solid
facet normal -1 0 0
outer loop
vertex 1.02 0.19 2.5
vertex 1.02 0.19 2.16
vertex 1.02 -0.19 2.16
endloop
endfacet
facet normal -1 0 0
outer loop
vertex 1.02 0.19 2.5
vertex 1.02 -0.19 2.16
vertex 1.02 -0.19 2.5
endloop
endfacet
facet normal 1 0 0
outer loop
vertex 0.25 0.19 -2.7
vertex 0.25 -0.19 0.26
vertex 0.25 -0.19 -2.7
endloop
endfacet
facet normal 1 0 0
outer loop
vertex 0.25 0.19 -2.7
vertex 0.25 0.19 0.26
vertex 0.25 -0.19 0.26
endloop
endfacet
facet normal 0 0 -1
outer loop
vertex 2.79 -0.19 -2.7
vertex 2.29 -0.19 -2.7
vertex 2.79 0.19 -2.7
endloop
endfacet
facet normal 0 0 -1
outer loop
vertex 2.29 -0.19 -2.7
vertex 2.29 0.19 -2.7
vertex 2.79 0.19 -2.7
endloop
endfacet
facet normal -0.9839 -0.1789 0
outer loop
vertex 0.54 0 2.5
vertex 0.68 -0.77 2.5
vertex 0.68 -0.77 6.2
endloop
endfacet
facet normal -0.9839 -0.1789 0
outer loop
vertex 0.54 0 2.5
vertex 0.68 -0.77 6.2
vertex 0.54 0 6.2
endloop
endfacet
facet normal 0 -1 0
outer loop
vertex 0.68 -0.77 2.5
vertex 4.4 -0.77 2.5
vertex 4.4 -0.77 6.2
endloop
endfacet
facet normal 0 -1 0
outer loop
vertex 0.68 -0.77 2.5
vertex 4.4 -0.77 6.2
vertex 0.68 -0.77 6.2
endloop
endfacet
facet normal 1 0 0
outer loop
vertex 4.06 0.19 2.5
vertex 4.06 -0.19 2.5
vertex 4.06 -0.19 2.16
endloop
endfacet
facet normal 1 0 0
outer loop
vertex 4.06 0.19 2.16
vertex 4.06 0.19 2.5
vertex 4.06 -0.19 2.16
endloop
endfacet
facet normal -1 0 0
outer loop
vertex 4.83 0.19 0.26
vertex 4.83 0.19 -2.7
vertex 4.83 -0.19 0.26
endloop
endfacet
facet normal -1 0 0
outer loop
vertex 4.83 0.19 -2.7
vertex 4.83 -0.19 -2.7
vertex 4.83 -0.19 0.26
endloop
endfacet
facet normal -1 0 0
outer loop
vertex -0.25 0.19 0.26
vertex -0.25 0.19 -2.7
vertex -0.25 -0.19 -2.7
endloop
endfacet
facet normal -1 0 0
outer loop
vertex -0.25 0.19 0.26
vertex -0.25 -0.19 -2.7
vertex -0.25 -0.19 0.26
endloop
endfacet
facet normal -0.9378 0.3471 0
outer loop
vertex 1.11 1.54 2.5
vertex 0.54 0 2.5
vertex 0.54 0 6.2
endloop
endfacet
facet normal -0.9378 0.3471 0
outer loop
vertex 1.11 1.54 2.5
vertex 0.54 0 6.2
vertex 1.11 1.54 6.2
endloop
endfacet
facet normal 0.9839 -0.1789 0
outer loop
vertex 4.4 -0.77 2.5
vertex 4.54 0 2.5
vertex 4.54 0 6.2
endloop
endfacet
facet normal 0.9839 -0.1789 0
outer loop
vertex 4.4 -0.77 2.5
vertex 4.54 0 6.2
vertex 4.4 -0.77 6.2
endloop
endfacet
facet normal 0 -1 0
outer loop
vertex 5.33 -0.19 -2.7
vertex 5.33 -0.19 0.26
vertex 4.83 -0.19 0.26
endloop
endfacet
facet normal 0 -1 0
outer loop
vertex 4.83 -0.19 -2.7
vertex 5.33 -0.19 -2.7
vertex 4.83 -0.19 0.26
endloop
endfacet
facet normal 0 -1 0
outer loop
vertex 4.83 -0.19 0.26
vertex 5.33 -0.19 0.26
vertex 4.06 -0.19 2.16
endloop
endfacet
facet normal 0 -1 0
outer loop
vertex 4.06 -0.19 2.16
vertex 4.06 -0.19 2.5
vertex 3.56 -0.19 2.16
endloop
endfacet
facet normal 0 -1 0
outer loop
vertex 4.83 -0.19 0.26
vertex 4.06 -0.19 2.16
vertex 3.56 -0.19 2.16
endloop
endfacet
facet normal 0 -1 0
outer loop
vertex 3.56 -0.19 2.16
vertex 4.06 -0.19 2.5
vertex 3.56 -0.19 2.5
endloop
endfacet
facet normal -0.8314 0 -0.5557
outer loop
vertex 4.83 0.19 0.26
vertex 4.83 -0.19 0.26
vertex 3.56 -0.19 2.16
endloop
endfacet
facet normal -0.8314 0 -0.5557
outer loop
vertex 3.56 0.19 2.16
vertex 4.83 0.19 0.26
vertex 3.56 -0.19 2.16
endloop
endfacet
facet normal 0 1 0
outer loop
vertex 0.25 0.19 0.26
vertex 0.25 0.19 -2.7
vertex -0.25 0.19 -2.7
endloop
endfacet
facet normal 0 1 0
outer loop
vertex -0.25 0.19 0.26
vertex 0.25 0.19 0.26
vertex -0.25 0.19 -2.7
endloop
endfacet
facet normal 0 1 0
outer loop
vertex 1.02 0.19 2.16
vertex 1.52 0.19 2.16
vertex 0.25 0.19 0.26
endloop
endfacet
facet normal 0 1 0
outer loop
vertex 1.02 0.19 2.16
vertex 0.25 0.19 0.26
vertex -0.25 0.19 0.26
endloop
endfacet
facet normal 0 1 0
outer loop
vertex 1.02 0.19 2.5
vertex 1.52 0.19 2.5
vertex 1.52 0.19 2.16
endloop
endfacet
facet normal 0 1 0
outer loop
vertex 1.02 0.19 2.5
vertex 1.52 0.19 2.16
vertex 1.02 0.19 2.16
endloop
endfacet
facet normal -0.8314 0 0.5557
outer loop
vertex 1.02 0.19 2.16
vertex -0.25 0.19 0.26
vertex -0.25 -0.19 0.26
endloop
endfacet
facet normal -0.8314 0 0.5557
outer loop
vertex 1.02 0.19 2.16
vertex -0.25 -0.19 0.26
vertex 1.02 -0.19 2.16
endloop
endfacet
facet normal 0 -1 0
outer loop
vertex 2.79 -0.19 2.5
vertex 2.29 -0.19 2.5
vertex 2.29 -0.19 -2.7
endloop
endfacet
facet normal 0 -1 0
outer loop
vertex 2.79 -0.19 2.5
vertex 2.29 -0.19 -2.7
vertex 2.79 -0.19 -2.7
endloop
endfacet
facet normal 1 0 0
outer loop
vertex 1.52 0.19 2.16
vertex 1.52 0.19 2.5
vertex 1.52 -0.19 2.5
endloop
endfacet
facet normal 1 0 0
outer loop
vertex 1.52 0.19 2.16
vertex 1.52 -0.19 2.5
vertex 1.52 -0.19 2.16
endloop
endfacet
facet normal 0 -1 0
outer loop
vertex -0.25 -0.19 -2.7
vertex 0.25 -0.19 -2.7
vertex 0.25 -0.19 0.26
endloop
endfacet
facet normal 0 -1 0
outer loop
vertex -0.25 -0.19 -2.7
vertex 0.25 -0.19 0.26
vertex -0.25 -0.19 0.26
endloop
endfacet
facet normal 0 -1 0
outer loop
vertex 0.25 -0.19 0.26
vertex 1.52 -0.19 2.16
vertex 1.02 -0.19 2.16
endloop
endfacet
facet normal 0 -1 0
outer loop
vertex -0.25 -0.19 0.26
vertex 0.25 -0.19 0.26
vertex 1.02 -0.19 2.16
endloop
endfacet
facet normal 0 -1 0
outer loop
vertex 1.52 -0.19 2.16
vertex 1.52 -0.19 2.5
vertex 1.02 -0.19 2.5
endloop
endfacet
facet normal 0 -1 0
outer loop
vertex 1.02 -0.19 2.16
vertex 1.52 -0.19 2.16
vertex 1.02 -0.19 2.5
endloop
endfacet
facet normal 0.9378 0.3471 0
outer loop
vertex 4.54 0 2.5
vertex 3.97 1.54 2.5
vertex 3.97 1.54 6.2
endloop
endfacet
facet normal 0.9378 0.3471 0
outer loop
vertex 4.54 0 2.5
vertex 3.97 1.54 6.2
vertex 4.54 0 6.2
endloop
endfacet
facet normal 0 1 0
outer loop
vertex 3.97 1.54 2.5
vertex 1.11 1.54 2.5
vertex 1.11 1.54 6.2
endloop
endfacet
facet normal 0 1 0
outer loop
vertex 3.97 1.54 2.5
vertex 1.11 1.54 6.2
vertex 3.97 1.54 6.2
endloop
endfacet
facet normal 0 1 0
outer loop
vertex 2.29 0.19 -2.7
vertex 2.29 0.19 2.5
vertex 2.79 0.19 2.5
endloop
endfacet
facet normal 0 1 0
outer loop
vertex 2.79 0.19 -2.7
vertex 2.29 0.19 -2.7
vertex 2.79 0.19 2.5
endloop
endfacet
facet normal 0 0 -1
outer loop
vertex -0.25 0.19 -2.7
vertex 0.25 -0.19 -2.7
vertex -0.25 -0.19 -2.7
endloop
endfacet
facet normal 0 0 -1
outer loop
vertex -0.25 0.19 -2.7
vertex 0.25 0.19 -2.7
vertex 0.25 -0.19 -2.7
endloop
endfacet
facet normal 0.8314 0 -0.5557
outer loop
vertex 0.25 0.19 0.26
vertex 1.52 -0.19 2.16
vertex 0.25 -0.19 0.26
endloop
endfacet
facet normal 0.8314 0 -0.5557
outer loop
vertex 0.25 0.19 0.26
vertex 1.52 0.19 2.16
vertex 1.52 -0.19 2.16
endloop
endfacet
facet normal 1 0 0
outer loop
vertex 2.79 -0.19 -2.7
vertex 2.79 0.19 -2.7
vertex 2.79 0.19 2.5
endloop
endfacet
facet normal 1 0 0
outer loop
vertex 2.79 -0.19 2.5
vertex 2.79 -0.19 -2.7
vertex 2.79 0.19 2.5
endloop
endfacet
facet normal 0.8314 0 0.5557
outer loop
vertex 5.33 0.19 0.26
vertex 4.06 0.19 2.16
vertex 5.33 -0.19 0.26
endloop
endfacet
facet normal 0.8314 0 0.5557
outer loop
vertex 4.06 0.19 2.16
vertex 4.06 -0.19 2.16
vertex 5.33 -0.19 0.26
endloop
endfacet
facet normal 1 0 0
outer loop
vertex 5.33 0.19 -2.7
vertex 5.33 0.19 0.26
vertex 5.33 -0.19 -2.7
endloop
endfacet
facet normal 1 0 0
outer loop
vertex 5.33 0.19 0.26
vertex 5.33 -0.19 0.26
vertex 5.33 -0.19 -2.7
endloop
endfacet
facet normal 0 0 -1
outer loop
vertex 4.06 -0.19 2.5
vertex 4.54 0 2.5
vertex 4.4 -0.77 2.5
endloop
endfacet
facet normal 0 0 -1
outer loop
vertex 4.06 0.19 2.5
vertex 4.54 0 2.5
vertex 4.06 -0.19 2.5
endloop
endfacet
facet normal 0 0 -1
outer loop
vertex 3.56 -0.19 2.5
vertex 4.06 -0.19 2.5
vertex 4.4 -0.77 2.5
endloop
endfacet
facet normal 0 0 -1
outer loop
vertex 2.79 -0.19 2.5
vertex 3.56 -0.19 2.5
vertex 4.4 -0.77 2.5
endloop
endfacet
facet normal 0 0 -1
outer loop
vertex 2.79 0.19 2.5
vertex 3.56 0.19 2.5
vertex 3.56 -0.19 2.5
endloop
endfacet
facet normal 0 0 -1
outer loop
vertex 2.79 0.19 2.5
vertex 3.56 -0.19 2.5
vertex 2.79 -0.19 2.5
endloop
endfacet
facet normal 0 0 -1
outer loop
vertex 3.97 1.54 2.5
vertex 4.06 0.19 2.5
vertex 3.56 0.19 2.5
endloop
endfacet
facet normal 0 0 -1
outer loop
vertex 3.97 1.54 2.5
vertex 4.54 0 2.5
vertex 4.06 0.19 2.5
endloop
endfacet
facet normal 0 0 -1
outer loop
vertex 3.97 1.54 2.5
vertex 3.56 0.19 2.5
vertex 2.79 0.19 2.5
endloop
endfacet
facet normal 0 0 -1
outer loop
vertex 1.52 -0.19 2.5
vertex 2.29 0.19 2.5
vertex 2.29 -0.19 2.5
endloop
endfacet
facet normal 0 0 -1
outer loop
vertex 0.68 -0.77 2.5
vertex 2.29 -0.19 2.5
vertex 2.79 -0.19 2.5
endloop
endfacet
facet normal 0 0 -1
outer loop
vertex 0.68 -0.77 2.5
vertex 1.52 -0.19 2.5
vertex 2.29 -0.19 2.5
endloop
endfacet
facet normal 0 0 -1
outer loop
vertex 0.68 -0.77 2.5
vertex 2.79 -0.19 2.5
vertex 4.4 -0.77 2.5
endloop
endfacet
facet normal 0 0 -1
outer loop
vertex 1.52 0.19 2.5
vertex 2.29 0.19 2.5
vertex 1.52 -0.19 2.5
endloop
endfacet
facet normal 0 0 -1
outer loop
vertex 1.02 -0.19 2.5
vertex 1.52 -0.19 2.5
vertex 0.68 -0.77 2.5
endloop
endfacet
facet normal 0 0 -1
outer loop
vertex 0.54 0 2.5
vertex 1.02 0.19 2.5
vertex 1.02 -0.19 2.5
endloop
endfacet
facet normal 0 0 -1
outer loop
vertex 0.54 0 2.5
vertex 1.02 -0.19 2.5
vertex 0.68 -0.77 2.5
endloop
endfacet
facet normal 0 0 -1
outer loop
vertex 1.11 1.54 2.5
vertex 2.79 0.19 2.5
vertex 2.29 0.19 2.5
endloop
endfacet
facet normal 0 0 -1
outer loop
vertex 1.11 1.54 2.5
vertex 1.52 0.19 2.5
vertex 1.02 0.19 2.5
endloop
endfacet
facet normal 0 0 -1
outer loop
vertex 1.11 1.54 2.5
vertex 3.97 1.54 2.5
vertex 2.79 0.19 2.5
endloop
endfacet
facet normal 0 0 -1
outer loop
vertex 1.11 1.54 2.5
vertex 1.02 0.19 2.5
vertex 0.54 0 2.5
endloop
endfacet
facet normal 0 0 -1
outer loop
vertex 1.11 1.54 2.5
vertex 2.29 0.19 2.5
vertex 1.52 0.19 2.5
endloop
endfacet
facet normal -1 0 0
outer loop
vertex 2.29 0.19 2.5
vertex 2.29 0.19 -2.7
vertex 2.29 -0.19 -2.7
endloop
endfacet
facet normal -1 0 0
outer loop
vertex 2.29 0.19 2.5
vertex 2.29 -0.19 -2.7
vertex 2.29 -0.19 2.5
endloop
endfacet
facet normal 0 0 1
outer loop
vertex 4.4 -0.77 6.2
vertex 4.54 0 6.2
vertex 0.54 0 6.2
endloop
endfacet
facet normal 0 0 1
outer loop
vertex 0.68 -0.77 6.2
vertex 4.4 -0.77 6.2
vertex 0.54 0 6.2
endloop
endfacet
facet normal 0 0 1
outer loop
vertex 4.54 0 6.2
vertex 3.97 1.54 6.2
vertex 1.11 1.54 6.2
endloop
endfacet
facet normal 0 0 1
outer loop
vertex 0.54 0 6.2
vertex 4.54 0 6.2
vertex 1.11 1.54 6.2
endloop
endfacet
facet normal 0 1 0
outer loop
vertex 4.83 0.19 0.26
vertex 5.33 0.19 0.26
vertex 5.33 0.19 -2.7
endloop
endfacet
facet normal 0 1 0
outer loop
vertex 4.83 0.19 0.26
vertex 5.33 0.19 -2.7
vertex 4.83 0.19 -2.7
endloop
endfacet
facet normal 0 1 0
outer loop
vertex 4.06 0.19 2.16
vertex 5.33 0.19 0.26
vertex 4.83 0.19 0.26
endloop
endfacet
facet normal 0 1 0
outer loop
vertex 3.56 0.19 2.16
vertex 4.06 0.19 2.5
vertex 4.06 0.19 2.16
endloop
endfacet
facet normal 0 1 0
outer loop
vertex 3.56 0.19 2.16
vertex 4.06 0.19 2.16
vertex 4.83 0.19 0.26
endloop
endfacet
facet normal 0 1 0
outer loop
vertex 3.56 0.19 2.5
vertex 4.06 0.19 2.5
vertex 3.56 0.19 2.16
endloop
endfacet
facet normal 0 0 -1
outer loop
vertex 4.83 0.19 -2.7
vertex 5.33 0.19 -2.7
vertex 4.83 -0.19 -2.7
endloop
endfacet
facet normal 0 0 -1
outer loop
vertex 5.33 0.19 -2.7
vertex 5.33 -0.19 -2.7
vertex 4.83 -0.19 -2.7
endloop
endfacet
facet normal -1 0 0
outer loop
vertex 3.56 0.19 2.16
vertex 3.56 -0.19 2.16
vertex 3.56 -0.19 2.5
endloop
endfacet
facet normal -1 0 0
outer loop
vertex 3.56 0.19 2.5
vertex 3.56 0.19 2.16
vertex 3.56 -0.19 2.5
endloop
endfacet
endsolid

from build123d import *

# Parameters (mm, degrees)
PAD_DEPTH    = 3.7
SKETCH001_W  = 0.5
SKETCH001_H  = 5.5
PAD001_DEPTH = 0.19


with BuildPart() as pad:
    # Sketch002 → Pad (new body)
    with BuildSketch(Plane.XY.offset(2.5)):
        Polygon((1.11, 1.54), (3.97, 1.54), (4.54, 0), (4.4, -0.77), (0.68, -0.77), (0.54, 0), align=None)
    extrude(amount=PAD_DEPTH)


with BuildPart() as to_92s_wide:
    # Sketch001 → Pad001 (new body, symmetric)
    with BuildSketch(Plane.XZ):
        with Locations((2.54, 0.05)):
            Rectangle(SKETCH001_W, SKETCH001_H)
        Polygon((0.25, -2.7), (-0.25, -2.7), (-0.25, 0.26), (1.02, 2.16), (1.02, 2.8), (1.52, 2.8), (1.52, 2.16), (0.25, 0.26), align=None)
        Polygon((3.56, 2.8), (4.06, 2.8), (4.06, 2.16), (5.33, 0.26), (5.33, -2.7), (4.83, -2.7), (4.83, 0.26), (3.56, 2.16), align=None)
    extrude(amount=PAD001_DEPTH, both=True)

    # Pad001_mp_cp: union Pad
    add(pad.part)


solid = to_92s_wide.part
